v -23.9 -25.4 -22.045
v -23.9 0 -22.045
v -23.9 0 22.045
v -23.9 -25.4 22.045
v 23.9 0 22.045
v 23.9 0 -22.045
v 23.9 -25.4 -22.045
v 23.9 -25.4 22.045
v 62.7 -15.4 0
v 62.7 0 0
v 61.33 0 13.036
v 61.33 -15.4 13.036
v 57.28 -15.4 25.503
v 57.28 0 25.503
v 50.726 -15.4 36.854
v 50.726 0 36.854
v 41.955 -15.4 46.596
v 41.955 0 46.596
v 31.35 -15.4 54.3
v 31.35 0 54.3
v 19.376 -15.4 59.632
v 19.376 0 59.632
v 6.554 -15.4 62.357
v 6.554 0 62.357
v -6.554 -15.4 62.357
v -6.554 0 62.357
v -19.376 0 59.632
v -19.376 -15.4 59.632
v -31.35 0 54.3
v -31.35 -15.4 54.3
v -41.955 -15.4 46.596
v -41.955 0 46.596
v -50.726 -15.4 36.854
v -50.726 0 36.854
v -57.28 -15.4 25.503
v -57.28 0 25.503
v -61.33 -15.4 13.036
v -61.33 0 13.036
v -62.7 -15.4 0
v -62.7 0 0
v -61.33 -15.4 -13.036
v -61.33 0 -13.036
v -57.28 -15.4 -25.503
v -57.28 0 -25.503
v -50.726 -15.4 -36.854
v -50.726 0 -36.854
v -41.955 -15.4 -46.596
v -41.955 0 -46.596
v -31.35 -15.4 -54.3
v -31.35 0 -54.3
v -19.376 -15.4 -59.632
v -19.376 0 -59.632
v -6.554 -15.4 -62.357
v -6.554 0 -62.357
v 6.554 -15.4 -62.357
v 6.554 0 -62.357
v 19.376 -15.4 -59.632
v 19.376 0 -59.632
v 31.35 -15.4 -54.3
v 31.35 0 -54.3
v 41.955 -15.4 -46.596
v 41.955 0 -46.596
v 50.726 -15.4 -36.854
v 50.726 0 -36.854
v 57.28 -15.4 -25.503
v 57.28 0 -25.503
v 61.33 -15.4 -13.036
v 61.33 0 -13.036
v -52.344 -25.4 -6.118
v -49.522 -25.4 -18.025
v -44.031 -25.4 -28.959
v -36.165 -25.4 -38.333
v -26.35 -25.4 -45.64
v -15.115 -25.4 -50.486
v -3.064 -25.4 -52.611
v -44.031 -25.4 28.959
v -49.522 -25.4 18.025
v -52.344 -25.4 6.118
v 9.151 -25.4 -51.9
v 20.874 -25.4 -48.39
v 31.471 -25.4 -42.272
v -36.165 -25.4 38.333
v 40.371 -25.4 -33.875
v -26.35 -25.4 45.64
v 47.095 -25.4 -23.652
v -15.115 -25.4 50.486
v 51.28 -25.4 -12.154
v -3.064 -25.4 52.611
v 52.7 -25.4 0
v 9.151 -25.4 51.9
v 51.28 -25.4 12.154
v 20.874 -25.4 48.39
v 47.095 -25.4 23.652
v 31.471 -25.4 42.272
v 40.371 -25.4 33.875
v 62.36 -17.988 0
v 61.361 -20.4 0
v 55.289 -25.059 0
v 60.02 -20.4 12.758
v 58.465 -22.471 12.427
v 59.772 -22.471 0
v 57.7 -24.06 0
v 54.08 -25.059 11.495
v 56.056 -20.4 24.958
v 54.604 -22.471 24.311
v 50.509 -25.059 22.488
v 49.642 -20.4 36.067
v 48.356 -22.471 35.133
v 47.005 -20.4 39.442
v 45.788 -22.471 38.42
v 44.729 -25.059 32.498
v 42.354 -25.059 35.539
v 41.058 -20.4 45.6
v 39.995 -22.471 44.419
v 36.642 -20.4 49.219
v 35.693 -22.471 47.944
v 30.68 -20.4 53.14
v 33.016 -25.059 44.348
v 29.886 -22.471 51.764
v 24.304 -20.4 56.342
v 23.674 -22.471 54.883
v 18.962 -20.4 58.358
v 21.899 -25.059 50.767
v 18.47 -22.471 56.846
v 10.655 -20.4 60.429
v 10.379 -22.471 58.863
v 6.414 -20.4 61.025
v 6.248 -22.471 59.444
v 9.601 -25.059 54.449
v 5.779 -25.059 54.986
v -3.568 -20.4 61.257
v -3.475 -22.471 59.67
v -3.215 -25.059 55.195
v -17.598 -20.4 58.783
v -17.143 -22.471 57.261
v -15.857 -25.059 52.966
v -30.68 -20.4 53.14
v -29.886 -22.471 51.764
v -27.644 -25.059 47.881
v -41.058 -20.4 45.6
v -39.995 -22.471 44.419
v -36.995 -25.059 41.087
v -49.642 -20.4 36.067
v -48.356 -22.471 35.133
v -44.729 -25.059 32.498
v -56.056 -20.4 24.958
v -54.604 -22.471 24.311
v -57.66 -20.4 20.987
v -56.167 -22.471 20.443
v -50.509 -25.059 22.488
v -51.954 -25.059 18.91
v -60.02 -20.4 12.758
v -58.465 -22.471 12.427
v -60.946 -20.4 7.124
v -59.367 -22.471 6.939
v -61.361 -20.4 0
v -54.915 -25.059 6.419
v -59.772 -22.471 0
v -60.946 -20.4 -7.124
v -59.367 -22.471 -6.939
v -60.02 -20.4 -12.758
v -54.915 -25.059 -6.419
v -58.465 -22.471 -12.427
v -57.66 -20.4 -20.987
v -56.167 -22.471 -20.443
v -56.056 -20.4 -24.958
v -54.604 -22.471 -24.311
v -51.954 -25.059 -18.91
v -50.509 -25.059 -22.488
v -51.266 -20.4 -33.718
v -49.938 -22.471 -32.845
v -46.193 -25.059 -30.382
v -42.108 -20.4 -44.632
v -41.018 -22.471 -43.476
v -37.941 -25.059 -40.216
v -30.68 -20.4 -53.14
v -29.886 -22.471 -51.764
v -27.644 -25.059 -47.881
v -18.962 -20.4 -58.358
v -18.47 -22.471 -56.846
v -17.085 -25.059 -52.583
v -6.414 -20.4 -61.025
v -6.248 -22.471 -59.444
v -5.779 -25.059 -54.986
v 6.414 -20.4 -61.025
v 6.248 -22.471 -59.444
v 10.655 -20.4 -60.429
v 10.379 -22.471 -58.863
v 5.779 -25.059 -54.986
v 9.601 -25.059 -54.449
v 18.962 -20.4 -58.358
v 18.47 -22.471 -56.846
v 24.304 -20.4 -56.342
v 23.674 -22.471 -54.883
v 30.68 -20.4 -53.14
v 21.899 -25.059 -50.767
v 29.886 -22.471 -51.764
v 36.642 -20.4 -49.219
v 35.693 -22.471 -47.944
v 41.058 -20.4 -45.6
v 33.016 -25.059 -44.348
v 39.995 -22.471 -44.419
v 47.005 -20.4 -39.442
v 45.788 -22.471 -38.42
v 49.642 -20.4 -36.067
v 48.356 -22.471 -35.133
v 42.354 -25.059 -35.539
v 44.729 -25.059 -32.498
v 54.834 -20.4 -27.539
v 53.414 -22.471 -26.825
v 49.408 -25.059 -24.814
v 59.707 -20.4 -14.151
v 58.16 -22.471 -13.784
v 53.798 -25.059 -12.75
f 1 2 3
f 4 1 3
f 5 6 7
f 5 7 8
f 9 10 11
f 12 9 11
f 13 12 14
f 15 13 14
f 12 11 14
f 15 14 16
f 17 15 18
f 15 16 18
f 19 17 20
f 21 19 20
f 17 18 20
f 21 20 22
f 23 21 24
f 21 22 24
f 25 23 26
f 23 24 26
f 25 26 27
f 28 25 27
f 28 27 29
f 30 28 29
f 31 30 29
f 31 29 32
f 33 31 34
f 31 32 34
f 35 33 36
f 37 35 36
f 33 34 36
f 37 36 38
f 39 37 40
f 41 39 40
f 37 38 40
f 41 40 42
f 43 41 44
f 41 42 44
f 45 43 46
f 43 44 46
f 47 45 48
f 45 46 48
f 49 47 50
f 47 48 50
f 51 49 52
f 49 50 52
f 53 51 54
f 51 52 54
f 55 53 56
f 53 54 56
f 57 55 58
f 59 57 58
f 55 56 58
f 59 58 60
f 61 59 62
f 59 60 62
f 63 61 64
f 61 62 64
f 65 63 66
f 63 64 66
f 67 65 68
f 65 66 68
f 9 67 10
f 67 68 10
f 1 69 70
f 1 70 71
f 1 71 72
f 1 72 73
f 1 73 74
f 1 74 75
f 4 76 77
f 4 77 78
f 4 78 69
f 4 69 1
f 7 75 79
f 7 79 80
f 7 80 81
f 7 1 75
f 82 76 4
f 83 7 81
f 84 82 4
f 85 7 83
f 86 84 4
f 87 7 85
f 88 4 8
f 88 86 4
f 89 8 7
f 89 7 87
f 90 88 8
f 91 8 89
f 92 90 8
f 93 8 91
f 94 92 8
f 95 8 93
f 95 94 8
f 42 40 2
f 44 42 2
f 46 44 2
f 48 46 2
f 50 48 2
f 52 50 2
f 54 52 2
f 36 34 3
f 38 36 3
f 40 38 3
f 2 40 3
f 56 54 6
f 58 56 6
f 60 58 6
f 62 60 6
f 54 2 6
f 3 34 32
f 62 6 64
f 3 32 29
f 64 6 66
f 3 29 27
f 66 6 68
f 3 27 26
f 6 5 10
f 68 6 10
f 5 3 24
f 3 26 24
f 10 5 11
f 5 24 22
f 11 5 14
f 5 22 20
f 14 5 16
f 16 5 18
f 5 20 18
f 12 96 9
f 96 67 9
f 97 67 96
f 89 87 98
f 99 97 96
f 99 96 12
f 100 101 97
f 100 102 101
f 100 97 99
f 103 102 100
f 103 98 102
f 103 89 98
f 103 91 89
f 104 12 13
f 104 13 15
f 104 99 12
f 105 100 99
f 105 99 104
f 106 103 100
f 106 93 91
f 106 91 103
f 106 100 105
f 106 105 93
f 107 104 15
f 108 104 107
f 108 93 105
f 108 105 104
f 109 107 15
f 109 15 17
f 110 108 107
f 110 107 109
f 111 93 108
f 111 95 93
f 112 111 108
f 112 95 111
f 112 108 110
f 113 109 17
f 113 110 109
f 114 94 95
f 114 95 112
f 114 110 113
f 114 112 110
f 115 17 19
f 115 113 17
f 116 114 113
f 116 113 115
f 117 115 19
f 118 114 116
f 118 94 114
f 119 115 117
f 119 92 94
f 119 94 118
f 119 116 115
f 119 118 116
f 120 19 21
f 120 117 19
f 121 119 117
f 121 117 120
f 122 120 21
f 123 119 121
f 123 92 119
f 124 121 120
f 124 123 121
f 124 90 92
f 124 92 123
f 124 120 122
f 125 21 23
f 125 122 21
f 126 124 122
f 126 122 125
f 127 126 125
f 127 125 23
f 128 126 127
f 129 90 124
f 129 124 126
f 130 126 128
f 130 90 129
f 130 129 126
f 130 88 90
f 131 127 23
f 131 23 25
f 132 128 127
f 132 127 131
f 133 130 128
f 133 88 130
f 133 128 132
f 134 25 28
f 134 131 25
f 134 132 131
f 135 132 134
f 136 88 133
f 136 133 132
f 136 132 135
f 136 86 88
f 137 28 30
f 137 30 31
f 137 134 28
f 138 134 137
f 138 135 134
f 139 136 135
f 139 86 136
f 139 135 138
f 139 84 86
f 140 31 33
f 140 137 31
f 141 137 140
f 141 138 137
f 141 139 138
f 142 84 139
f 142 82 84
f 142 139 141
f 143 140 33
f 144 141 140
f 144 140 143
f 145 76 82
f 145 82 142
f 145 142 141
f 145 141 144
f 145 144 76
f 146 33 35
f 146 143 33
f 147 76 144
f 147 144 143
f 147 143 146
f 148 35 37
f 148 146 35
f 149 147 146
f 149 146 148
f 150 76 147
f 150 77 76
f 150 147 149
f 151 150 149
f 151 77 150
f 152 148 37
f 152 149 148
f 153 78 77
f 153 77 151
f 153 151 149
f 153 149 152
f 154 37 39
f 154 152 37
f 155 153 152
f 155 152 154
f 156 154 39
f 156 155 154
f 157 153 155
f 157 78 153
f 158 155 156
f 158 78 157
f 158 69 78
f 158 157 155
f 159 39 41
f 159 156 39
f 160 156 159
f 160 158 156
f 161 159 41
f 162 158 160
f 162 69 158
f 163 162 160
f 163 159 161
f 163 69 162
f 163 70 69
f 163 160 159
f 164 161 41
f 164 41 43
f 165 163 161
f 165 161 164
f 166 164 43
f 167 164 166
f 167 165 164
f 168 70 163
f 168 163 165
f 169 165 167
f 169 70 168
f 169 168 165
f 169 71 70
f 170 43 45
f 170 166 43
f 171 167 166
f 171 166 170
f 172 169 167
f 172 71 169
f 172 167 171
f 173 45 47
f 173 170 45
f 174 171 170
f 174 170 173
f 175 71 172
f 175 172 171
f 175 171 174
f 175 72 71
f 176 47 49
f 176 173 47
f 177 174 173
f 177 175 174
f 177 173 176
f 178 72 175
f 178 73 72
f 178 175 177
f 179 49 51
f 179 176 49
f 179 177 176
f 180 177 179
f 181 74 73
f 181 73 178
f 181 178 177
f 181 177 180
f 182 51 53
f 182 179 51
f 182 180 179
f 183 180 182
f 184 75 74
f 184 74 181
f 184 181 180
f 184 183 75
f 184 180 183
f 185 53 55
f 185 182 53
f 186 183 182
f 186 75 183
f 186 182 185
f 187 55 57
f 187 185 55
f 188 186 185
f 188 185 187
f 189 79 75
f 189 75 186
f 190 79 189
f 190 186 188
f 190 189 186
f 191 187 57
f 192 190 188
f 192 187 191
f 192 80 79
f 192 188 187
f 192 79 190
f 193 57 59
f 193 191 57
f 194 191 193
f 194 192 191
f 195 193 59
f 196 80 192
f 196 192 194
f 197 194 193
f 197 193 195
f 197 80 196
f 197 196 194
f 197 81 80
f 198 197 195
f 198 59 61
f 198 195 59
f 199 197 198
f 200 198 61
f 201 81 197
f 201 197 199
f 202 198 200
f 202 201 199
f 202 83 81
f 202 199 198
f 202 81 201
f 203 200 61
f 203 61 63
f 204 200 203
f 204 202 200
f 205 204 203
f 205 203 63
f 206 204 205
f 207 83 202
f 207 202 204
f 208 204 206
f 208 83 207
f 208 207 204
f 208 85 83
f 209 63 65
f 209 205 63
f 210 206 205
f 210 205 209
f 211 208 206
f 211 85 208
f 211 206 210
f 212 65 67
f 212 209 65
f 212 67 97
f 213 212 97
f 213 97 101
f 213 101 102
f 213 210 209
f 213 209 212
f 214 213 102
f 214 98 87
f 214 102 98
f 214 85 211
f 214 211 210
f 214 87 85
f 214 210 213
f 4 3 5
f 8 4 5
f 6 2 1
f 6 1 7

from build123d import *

# Parameters (mm, degrees)
F0_R     = 62.700464
F2_DEPTH = 25.4
F1_W     = 47.8006
F1_H     = 44.089228
F3_DEPTH = 30
F4_R     = 10


with BuildPart() as f2:
    # F0 (on Front) → F2 (new body)
    with BuildSketch(Plane.XZ):
        Circle(F0_R)
    extrude(amount=F2_DEPTH)

    # F1 (on Front) → F3 (cut)
    with BuildSketch(Plane.XZ):
        Rectangle(F1_W, F1_H)
    extrude(amount=F3_DEPTH, mode=Mode.SUBTRACT)

    # F4
    f4_edges = [f2.edges().sort_by_distance(p)[0] for p in [
        (-62.700464, -25.4, 0),
    ]]
    fillet(f4_edges, radius=F4_R)


solid = f2.part
